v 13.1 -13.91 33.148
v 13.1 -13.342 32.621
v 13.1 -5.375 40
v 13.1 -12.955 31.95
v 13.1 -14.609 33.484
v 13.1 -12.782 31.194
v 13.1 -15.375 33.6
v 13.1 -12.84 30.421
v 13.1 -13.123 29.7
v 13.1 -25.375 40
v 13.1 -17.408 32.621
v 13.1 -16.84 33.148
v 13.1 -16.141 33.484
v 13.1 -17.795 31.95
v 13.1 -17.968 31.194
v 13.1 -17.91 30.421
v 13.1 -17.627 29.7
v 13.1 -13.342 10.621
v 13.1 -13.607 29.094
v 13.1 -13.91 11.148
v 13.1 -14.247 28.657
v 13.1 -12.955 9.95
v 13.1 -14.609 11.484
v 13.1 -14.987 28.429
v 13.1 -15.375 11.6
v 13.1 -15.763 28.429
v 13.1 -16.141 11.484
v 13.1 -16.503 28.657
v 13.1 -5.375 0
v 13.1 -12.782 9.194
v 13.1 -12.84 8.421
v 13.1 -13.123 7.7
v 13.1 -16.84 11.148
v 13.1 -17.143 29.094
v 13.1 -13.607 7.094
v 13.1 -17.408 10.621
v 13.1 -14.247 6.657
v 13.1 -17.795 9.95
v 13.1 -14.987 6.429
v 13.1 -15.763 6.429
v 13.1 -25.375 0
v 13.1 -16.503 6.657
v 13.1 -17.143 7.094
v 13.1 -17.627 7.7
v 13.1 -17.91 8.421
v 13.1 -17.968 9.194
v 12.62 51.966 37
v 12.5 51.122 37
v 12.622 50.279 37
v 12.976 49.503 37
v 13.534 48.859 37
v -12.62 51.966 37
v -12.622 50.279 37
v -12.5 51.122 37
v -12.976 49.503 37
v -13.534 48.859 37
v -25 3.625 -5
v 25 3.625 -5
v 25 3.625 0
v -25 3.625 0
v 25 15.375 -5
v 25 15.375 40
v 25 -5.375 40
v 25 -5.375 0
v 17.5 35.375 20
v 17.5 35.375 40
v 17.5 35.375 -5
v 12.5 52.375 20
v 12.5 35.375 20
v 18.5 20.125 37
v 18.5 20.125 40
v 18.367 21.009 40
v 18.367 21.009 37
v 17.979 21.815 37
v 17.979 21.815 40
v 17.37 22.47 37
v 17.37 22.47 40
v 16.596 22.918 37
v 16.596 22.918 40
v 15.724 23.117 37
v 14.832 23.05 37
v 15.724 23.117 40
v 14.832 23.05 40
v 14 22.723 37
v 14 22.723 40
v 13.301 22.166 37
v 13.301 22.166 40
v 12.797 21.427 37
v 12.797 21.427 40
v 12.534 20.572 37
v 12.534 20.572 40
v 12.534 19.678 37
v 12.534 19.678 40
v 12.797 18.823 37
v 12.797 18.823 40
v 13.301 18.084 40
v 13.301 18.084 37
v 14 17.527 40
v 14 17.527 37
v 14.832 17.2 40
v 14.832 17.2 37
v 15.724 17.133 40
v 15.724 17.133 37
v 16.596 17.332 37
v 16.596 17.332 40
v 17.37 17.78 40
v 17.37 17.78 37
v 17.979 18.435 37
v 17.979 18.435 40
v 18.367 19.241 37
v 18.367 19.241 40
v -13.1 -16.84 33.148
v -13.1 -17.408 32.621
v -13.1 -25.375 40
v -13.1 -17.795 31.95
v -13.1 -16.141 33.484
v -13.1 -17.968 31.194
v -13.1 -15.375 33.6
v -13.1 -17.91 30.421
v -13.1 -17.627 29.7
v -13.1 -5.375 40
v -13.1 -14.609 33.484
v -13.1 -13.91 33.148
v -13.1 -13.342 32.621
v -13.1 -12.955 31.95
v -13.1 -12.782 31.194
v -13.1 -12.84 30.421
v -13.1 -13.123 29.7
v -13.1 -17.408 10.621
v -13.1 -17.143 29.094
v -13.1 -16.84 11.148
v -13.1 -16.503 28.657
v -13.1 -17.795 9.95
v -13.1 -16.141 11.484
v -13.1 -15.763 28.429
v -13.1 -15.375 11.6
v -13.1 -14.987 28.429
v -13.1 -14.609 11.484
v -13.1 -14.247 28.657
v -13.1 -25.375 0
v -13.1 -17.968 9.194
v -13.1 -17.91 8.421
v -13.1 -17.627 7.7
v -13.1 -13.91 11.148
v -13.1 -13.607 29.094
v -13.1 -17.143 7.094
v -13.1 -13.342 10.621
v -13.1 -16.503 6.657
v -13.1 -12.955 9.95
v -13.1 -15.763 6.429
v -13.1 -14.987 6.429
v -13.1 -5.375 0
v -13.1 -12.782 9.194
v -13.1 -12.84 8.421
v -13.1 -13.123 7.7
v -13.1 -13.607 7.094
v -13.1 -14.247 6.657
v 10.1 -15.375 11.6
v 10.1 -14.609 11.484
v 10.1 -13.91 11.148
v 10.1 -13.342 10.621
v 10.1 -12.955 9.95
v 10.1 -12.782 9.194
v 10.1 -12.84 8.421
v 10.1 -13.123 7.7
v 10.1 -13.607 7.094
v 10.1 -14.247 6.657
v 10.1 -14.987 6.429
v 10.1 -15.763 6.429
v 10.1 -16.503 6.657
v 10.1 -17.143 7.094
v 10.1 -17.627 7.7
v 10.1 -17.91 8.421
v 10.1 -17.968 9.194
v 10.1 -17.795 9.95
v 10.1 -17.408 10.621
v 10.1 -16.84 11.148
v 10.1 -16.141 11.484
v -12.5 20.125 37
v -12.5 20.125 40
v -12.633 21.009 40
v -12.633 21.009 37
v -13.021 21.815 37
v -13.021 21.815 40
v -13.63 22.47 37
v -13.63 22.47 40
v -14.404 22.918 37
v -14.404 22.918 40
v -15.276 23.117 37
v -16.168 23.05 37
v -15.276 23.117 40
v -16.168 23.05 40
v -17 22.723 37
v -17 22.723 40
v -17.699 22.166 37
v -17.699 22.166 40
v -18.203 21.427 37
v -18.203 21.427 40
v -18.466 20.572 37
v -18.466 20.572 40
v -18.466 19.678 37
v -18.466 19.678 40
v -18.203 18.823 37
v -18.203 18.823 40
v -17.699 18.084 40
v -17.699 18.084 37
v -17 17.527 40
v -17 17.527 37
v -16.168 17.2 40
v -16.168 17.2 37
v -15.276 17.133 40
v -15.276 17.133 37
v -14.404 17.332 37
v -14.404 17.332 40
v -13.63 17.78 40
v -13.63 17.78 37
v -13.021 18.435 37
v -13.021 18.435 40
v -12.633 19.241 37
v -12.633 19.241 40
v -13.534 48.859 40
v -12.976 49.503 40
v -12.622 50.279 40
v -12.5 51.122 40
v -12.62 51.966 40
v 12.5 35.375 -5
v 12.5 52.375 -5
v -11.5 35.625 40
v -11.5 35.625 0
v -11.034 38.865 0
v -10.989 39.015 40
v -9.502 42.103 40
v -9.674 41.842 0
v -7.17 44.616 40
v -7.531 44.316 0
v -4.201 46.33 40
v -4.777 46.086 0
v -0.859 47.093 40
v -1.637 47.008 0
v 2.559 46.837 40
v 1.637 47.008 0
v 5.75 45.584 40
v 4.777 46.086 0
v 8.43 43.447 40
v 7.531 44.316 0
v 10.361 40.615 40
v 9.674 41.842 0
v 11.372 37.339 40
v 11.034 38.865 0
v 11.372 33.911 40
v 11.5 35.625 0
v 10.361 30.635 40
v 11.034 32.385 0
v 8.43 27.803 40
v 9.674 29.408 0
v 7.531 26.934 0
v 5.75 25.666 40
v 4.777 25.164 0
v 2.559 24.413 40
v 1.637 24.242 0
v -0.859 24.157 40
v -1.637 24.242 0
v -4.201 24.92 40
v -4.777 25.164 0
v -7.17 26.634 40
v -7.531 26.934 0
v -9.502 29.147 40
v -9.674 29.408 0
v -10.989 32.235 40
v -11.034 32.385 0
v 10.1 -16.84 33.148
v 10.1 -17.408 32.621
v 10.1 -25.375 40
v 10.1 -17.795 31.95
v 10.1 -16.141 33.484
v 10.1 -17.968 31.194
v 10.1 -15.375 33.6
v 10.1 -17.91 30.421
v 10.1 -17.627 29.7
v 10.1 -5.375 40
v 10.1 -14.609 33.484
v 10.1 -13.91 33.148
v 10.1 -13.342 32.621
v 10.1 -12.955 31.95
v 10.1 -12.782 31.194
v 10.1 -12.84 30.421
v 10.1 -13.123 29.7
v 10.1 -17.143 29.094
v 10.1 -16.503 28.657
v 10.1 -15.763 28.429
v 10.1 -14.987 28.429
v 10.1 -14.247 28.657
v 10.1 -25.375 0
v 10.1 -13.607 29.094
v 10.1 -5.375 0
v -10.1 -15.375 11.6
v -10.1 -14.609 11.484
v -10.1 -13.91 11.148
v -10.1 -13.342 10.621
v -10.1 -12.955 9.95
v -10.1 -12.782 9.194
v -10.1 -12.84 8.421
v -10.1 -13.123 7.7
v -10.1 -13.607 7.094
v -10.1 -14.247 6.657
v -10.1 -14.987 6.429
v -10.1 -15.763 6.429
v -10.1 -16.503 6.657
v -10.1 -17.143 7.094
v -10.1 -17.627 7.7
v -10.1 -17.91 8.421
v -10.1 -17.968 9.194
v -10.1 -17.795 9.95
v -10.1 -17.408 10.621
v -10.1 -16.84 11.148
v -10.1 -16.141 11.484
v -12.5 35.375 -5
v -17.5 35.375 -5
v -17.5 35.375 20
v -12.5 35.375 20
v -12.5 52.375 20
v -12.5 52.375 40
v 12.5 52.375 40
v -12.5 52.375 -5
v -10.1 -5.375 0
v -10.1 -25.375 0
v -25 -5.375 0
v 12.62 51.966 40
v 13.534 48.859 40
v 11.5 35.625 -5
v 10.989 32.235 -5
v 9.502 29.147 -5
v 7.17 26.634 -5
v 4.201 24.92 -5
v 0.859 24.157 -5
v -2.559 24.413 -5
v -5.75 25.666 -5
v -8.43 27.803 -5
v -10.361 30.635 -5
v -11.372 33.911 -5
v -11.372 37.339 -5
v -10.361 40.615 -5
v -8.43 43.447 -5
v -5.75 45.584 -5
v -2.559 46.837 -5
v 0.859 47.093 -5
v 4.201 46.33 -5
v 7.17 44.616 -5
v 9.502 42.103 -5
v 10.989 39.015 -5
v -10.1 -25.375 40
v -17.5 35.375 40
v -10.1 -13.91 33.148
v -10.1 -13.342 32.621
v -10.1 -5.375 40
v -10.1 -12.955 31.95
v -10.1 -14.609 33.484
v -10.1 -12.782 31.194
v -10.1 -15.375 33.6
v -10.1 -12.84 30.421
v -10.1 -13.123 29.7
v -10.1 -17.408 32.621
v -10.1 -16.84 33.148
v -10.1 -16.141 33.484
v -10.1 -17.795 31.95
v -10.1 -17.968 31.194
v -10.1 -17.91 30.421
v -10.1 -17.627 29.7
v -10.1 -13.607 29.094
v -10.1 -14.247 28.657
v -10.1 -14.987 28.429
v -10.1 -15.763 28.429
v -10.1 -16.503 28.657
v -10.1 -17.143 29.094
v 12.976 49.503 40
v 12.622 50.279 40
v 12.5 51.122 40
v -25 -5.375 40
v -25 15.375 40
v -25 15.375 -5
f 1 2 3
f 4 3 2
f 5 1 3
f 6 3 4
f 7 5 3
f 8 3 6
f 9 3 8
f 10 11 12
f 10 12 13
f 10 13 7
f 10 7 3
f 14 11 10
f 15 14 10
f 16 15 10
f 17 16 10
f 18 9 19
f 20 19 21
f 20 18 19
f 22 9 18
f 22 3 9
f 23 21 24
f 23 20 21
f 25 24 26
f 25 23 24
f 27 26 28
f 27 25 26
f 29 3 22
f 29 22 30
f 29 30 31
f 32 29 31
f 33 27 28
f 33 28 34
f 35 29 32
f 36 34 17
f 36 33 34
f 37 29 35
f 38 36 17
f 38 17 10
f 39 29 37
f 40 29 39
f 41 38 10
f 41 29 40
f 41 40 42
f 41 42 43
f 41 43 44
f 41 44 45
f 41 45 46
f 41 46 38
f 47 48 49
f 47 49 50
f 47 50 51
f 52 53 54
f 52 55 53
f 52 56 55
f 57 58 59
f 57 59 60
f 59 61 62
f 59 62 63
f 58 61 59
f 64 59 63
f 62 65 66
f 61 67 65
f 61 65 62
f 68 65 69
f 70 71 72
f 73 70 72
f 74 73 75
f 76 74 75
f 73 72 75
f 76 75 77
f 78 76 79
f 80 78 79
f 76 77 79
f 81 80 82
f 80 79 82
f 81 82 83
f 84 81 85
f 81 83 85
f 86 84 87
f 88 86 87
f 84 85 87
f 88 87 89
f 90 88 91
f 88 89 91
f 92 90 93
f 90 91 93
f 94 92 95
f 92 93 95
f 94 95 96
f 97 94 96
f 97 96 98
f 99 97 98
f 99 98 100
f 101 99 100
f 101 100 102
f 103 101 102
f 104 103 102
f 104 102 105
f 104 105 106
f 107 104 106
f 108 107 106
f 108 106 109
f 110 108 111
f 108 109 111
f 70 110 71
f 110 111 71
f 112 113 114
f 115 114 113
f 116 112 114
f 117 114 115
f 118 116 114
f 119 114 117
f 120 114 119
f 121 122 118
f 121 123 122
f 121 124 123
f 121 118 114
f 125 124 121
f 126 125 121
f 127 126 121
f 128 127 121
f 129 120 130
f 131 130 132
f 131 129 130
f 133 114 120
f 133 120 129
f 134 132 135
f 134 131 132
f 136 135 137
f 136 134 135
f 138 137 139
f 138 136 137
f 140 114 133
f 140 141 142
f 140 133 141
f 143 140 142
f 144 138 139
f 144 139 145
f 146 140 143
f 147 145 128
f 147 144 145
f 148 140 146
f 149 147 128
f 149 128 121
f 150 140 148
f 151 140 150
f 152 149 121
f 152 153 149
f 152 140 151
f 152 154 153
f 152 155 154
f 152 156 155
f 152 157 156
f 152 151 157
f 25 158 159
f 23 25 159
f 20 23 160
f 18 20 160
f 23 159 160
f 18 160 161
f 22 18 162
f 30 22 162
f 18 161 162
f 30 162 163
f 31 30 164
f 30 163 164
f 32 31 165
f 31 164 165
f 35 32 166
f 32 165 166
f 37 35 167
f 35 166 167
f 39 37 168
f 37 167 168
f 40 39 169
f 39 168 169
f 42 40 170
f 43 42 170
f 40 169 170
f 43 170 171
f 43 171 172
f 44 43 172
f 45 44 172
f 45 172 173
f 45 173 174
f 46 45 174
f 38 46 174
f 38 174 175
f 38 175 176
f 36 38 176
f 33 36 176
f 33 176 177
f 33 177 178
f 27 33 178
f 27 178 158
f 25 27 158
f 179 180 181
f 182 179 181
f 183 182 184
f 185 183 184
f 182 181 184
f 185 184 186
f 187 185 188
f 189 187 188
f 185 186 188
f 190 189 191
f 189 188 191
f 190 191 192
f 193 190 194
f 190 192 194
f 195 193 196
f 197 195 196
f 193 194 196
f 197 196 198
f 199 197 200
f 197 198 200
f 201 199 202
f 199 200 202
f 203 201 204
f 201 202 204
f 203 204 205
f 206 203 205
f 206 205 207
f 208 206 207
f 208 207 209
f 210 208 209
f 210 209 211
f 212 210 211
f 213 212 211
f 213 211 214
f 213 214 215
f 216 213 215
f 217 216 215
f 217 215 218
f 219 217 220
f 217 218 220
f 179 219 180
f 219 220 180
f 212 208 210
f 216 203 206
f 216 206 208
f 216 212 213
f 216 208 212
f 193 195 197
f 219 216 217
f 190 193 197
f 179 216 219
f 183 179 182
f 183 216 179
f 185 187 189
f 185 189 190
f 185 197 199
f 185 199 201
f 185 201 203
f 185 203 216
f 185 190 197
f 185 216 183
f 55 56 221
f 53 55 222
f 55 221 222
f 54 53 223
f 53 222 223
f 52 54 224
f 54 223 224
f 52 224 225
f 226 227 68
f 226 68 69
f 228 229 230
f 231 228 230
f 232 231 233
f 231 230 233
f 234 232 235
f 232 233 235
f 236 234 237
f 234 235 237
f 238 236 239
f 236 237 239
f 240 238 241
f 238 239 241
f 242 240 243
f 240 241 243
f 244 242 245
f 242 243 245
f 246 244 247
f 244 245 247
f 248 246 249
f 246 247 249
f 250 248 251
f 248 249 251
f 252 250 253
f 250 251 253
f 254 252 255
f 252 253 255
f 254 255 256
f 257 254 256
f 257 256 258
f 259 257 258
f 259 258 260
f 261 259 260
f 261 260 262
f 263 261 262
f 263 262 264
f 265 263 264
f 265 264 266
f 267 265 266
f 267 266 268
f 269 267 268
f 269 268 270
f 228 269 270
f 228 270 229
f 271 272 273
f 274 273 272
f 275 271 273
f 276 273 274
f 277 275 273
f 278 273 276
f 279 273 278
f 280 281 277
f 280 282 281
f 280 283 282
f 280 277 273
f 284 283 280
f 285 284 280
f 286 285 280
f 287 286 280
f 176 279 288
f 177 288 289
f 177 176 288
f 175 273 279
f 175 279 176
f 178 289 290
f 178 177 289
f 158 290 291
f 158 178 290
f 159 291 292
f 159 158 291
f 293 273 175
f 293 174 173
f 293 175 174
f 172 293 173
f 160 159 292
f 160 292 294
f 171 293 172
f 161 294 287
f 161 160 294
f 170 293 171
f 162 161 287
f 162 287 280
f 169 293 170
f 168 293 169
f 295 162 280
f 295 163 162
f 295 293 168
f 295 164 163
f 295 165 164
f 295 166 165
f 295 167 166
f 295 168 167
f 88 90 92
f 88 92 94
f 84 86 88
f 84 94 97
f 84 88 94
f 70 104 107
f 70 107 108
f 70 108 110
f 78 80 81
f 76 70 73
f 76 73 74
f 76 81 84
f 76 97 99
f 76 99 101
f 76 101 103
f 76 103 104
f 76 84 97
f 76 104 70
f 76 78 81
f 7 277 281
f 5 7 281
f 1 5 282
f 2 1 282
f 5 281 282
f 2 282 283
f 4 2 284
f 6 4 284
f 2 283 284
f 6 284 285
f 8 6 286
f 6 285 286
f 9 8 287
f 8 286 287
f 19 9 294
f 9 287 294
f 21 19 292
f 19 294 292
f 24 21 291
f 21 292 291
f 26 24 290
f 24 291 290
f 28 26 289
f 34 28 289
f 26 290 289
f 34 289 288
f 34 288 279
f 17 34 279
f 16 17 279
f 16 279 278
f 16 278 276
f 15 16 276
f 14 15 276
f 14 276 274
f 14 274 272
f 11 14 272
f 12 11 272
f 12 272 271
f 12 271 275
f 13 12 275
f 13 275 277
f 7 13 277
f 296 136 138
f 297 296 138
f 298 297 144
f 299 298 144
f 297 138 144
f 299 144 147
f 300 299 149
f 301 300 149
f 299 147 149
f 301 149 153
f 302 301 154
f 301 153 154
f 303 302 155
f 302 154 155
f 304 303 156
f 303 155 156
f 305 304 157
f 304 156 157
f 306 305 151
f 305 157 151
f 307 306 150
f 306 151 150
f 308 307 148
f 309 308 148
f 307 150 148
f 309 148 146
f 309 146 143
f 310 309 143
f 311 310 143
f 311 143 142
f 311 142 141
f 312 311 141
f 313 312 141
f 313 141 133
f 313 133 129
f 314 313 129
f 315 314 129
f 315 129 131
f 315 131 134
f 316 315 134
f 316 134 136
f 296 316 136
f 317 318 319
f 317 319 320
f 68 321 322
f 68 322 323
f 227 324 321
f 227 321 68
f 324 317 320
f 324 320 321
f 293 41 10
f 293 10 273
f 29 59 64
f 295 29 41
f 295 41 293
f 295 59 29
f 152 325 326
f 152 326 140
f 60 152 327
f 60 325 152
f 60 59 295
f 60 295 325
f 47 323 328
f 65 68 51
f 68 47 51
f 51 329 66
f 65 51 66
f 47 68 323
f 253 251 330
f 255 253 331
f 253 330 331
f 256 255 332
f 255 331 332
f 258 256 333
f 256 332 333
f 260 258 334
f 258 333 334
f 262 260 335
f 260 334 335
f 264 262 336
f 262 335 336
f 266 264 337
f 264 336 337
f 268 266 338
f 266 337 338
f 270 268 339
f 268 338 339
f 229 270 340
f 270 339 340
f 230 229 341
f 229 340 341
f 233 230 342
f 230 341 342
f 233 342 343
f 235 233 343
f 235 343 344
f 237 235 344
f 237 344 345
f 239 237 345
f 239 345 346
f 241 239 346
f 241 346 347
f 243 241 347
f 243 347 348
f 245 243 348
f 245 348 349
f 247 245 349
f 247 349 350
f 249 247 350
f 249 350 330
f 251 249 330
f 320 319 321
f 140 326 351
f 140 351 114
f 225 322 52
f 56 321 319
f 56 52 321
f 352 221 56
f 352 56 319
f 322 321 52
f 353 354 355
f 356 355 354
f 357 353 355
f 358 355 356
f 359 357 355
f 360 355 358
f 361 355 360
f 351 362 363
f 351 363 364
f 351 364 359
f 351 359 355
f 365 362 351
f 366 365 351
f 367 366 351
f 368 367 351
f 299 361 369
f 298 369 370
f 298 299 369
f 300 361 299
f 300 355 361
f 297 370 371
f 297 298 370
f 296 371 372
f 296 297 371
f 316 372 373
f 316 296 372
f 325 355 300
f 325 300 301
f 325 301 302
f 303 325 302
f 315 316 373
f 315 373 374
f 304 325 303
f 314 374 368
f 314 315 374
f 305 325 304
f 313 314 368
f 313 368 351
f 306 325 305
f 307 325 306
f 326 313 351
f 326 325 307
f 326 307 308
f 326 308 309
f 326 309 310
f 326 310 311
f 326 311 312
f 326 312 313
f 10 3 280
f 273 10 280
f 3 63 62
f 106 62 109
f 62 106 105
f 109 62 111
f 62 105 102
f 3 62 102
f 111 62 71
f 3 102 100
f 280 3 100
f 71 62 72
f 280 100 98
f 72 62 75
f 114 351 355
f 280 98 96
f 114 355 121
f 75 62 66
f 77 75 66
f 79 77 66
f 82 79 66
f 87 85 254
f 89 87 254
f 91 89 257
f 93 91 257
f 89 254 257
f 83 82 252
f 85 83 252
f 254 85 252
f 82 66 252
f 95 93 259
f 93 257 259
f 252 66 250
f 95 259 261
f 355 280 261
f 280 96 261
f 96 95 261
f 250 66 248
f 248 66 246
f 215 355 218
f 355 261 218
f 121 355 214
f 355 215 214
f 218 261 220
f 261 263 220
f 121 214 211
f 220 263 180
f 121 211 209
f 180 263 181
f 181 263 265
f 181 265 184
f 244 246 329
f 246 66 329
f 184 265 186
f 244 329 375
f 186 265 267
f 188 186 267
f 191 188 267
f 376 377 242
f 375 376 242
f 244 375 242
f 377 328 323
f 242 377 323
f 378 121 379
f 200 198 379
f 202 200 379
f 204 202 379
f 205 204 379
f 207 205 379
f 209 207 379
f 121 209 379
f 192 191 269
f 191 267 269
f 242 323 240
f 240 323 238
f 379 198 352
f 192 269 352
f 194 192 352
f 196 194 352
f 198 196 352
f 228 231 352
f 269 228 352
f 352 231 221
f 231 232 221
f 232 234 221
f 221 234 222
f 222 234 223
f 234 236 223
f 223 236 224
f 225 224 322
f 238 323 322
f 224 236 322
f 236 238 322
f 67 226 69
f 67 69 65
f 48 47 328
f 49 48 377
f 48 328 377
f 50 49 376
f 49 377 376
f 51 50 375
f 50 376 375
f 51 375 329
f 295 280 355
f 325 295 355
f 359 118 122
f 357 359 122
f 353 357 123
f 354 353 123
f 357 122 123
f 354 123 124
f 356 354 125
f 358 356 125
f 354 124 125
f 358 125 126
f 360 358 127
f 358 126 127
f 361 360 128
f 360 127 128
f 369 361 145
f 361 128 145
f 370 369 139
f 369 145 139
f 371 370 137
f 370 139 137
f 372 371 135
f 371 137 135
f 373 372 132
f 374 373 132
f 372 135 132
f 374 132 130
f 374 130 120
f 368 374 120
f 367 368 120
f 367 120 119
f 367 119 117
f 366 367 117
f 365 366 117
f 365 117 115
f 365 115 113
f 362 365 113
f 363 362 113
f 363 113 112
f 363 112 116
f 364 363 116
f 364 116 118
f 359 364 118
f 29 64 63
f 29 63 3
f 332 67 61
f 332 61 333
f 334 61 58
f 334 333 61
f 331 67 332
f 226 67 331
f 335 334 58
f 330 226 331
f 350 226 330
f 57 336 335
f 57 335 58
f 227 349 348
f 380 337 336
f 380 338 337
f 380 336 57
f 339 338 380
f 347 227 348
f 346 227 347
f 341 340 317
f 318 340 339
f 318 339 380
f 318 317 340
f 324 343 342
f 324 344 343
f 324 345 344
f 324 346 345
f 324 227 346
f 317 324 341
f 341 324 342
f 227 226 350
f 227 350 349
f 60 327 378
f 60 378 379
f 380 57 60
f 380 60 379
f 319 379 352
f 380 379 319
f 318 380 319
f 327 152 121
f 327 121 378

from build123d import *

# Parameters (mm, degrees)
EXTRUDE_1_DEPTH     = 40
SKETCH_2_W          = 25
SKETCH_2_H          = 47
EXTRUDE_2_DEPTH     = 40
HOLE_WIZARD_3_D     = 23
EXTRUDE_3_DEPTH     = 40
EXTRUDE_5_DEPTH     = 20
HOLE_WIZARD_4_D     = 5.2
SKETCH_15_R         = 3
CUT_EXTRUDE_1_DEPTH = 3
EXTRUDE_START       = 5
SKETCH_16_R         = 11.5
EXTRUDE_6_DEPTH     = 5


with BuildPart() as part:
    # 草图1 → 凸台-拉伸1 (new body)
    with BuildSketch(Plane.XY):
        Polygon((13.1, -5.375), (13.1, -25.375), (10.1, -25.375), (10.1, -5.375), (-10.1, -5.375), (-10.1, -25.375), (-13.1, -25.375), (-13.1, -5.375), (-25, -5.375), (-25, 5.375), (25, 5.375), (25, -5.375), align=None)
    extrude(amount=EXTRUDE_1_DEPTH)

    # 草图2 → 凸台-拉伸2 (add)
    with BuildSketch(Plane(origin=(0, 0, 0), x_dir=(-1, 0, 0), z_dir=(0, 0, -1))):
        with Locations((0, 28.875)):
            Rectangle(SKETCH_2_W, SKETCH_2_H)
    extrude(amount=-EXTRUDE_2_DEPTH)

    # 孔3 (through all)
    with Locations(Plane.XY.offset(40)):
        with Locations((0, 35.625)):
            Hole(HOLE_WIZARD_3_D / 2)

    # 草图10 → 凸台-拉伸3 (add)
    with BuildSketch(Plane.XY.offset(40)):
        Polygon((12.5, 35.375), (17.5, 35.375), (25, 15.375), (25, 5.375), (12.5, 5.375), align=None)
        Polygon((-12.5, 35.375), (-12.5, 5.375), (-25, 5.375), (-25, 15.375), (-17.5, 35.375), align=None)
    extrude(amount=-EXTRUDE_3_DEPTH)

    # 草图12 → 凸台-拉伸5 (add)
    with BuildSketch(Plane.XY.offset(40)):
        Polygon((12.5, 52.375), (17.5, 35.375), (12.5, 35.375), align=None)
        Polygon((-12.5, 52.375), (-17.5, 35.375), (-12.5, 35.375), align=None)
    extrude(amount=-EXTRUDE_5_DEPTH)

    # 孔4 (through all)
    with Locations(Plane(origin=(13.1, 0, 0), x_dir=(0, 0, -1), z_dir=(1, 0, 0))):
        with Locations((-31, -15.375), (-9, -15.375)):
            Hole(HOLE_WIZARD_4_D / 2)

    # 草图15 → 切除-拉伸1 (cut)
    with BuildSketch(Plane.XY.offset(40)):
        with Locations((-15.5, 51.125)):
            Circle(SKETCH_15_R)
        with Locations((15.5, 51.125)):
            Circle(SKETCH_15_R)
        with Locations((-15.5, 20.125)):
            Circle(SKETCH_15_R)
        with Locations((15.5, 20.125)):
            Circle(SKETCH_15_R)
    extrude(amount=-CUT_EXTRUDE_1_DEPTH, mode=Mode.SUBTRACT)

    # 草图16 → 凸台-拉伸6 (add)
    with BuildSketch(Plane(origin=(0, 0, 0), x_dir=(-1, 0, 0), z_dir=(0, 0, -1)).offset(EXTRUDE_START)):
        Polygon((-25, 3.625), (25, 3.625), (25, 15.375), (17.5, 35.375), (12.5, 35.375), (12.5, 52.375), (-12.5, 52.375), (-12.5, 35.375), (-17.5, 35.375), (-25, 15.375), align=None)
        with Locations(Location((0, 35.625, 0), (0, 0, 180))):
            Circle(SKETCH_16_R, mode=Mode.SUBTRACT)
    extrude(amount=-EXTRUDE_6_DEPTH)


solid = part.part
